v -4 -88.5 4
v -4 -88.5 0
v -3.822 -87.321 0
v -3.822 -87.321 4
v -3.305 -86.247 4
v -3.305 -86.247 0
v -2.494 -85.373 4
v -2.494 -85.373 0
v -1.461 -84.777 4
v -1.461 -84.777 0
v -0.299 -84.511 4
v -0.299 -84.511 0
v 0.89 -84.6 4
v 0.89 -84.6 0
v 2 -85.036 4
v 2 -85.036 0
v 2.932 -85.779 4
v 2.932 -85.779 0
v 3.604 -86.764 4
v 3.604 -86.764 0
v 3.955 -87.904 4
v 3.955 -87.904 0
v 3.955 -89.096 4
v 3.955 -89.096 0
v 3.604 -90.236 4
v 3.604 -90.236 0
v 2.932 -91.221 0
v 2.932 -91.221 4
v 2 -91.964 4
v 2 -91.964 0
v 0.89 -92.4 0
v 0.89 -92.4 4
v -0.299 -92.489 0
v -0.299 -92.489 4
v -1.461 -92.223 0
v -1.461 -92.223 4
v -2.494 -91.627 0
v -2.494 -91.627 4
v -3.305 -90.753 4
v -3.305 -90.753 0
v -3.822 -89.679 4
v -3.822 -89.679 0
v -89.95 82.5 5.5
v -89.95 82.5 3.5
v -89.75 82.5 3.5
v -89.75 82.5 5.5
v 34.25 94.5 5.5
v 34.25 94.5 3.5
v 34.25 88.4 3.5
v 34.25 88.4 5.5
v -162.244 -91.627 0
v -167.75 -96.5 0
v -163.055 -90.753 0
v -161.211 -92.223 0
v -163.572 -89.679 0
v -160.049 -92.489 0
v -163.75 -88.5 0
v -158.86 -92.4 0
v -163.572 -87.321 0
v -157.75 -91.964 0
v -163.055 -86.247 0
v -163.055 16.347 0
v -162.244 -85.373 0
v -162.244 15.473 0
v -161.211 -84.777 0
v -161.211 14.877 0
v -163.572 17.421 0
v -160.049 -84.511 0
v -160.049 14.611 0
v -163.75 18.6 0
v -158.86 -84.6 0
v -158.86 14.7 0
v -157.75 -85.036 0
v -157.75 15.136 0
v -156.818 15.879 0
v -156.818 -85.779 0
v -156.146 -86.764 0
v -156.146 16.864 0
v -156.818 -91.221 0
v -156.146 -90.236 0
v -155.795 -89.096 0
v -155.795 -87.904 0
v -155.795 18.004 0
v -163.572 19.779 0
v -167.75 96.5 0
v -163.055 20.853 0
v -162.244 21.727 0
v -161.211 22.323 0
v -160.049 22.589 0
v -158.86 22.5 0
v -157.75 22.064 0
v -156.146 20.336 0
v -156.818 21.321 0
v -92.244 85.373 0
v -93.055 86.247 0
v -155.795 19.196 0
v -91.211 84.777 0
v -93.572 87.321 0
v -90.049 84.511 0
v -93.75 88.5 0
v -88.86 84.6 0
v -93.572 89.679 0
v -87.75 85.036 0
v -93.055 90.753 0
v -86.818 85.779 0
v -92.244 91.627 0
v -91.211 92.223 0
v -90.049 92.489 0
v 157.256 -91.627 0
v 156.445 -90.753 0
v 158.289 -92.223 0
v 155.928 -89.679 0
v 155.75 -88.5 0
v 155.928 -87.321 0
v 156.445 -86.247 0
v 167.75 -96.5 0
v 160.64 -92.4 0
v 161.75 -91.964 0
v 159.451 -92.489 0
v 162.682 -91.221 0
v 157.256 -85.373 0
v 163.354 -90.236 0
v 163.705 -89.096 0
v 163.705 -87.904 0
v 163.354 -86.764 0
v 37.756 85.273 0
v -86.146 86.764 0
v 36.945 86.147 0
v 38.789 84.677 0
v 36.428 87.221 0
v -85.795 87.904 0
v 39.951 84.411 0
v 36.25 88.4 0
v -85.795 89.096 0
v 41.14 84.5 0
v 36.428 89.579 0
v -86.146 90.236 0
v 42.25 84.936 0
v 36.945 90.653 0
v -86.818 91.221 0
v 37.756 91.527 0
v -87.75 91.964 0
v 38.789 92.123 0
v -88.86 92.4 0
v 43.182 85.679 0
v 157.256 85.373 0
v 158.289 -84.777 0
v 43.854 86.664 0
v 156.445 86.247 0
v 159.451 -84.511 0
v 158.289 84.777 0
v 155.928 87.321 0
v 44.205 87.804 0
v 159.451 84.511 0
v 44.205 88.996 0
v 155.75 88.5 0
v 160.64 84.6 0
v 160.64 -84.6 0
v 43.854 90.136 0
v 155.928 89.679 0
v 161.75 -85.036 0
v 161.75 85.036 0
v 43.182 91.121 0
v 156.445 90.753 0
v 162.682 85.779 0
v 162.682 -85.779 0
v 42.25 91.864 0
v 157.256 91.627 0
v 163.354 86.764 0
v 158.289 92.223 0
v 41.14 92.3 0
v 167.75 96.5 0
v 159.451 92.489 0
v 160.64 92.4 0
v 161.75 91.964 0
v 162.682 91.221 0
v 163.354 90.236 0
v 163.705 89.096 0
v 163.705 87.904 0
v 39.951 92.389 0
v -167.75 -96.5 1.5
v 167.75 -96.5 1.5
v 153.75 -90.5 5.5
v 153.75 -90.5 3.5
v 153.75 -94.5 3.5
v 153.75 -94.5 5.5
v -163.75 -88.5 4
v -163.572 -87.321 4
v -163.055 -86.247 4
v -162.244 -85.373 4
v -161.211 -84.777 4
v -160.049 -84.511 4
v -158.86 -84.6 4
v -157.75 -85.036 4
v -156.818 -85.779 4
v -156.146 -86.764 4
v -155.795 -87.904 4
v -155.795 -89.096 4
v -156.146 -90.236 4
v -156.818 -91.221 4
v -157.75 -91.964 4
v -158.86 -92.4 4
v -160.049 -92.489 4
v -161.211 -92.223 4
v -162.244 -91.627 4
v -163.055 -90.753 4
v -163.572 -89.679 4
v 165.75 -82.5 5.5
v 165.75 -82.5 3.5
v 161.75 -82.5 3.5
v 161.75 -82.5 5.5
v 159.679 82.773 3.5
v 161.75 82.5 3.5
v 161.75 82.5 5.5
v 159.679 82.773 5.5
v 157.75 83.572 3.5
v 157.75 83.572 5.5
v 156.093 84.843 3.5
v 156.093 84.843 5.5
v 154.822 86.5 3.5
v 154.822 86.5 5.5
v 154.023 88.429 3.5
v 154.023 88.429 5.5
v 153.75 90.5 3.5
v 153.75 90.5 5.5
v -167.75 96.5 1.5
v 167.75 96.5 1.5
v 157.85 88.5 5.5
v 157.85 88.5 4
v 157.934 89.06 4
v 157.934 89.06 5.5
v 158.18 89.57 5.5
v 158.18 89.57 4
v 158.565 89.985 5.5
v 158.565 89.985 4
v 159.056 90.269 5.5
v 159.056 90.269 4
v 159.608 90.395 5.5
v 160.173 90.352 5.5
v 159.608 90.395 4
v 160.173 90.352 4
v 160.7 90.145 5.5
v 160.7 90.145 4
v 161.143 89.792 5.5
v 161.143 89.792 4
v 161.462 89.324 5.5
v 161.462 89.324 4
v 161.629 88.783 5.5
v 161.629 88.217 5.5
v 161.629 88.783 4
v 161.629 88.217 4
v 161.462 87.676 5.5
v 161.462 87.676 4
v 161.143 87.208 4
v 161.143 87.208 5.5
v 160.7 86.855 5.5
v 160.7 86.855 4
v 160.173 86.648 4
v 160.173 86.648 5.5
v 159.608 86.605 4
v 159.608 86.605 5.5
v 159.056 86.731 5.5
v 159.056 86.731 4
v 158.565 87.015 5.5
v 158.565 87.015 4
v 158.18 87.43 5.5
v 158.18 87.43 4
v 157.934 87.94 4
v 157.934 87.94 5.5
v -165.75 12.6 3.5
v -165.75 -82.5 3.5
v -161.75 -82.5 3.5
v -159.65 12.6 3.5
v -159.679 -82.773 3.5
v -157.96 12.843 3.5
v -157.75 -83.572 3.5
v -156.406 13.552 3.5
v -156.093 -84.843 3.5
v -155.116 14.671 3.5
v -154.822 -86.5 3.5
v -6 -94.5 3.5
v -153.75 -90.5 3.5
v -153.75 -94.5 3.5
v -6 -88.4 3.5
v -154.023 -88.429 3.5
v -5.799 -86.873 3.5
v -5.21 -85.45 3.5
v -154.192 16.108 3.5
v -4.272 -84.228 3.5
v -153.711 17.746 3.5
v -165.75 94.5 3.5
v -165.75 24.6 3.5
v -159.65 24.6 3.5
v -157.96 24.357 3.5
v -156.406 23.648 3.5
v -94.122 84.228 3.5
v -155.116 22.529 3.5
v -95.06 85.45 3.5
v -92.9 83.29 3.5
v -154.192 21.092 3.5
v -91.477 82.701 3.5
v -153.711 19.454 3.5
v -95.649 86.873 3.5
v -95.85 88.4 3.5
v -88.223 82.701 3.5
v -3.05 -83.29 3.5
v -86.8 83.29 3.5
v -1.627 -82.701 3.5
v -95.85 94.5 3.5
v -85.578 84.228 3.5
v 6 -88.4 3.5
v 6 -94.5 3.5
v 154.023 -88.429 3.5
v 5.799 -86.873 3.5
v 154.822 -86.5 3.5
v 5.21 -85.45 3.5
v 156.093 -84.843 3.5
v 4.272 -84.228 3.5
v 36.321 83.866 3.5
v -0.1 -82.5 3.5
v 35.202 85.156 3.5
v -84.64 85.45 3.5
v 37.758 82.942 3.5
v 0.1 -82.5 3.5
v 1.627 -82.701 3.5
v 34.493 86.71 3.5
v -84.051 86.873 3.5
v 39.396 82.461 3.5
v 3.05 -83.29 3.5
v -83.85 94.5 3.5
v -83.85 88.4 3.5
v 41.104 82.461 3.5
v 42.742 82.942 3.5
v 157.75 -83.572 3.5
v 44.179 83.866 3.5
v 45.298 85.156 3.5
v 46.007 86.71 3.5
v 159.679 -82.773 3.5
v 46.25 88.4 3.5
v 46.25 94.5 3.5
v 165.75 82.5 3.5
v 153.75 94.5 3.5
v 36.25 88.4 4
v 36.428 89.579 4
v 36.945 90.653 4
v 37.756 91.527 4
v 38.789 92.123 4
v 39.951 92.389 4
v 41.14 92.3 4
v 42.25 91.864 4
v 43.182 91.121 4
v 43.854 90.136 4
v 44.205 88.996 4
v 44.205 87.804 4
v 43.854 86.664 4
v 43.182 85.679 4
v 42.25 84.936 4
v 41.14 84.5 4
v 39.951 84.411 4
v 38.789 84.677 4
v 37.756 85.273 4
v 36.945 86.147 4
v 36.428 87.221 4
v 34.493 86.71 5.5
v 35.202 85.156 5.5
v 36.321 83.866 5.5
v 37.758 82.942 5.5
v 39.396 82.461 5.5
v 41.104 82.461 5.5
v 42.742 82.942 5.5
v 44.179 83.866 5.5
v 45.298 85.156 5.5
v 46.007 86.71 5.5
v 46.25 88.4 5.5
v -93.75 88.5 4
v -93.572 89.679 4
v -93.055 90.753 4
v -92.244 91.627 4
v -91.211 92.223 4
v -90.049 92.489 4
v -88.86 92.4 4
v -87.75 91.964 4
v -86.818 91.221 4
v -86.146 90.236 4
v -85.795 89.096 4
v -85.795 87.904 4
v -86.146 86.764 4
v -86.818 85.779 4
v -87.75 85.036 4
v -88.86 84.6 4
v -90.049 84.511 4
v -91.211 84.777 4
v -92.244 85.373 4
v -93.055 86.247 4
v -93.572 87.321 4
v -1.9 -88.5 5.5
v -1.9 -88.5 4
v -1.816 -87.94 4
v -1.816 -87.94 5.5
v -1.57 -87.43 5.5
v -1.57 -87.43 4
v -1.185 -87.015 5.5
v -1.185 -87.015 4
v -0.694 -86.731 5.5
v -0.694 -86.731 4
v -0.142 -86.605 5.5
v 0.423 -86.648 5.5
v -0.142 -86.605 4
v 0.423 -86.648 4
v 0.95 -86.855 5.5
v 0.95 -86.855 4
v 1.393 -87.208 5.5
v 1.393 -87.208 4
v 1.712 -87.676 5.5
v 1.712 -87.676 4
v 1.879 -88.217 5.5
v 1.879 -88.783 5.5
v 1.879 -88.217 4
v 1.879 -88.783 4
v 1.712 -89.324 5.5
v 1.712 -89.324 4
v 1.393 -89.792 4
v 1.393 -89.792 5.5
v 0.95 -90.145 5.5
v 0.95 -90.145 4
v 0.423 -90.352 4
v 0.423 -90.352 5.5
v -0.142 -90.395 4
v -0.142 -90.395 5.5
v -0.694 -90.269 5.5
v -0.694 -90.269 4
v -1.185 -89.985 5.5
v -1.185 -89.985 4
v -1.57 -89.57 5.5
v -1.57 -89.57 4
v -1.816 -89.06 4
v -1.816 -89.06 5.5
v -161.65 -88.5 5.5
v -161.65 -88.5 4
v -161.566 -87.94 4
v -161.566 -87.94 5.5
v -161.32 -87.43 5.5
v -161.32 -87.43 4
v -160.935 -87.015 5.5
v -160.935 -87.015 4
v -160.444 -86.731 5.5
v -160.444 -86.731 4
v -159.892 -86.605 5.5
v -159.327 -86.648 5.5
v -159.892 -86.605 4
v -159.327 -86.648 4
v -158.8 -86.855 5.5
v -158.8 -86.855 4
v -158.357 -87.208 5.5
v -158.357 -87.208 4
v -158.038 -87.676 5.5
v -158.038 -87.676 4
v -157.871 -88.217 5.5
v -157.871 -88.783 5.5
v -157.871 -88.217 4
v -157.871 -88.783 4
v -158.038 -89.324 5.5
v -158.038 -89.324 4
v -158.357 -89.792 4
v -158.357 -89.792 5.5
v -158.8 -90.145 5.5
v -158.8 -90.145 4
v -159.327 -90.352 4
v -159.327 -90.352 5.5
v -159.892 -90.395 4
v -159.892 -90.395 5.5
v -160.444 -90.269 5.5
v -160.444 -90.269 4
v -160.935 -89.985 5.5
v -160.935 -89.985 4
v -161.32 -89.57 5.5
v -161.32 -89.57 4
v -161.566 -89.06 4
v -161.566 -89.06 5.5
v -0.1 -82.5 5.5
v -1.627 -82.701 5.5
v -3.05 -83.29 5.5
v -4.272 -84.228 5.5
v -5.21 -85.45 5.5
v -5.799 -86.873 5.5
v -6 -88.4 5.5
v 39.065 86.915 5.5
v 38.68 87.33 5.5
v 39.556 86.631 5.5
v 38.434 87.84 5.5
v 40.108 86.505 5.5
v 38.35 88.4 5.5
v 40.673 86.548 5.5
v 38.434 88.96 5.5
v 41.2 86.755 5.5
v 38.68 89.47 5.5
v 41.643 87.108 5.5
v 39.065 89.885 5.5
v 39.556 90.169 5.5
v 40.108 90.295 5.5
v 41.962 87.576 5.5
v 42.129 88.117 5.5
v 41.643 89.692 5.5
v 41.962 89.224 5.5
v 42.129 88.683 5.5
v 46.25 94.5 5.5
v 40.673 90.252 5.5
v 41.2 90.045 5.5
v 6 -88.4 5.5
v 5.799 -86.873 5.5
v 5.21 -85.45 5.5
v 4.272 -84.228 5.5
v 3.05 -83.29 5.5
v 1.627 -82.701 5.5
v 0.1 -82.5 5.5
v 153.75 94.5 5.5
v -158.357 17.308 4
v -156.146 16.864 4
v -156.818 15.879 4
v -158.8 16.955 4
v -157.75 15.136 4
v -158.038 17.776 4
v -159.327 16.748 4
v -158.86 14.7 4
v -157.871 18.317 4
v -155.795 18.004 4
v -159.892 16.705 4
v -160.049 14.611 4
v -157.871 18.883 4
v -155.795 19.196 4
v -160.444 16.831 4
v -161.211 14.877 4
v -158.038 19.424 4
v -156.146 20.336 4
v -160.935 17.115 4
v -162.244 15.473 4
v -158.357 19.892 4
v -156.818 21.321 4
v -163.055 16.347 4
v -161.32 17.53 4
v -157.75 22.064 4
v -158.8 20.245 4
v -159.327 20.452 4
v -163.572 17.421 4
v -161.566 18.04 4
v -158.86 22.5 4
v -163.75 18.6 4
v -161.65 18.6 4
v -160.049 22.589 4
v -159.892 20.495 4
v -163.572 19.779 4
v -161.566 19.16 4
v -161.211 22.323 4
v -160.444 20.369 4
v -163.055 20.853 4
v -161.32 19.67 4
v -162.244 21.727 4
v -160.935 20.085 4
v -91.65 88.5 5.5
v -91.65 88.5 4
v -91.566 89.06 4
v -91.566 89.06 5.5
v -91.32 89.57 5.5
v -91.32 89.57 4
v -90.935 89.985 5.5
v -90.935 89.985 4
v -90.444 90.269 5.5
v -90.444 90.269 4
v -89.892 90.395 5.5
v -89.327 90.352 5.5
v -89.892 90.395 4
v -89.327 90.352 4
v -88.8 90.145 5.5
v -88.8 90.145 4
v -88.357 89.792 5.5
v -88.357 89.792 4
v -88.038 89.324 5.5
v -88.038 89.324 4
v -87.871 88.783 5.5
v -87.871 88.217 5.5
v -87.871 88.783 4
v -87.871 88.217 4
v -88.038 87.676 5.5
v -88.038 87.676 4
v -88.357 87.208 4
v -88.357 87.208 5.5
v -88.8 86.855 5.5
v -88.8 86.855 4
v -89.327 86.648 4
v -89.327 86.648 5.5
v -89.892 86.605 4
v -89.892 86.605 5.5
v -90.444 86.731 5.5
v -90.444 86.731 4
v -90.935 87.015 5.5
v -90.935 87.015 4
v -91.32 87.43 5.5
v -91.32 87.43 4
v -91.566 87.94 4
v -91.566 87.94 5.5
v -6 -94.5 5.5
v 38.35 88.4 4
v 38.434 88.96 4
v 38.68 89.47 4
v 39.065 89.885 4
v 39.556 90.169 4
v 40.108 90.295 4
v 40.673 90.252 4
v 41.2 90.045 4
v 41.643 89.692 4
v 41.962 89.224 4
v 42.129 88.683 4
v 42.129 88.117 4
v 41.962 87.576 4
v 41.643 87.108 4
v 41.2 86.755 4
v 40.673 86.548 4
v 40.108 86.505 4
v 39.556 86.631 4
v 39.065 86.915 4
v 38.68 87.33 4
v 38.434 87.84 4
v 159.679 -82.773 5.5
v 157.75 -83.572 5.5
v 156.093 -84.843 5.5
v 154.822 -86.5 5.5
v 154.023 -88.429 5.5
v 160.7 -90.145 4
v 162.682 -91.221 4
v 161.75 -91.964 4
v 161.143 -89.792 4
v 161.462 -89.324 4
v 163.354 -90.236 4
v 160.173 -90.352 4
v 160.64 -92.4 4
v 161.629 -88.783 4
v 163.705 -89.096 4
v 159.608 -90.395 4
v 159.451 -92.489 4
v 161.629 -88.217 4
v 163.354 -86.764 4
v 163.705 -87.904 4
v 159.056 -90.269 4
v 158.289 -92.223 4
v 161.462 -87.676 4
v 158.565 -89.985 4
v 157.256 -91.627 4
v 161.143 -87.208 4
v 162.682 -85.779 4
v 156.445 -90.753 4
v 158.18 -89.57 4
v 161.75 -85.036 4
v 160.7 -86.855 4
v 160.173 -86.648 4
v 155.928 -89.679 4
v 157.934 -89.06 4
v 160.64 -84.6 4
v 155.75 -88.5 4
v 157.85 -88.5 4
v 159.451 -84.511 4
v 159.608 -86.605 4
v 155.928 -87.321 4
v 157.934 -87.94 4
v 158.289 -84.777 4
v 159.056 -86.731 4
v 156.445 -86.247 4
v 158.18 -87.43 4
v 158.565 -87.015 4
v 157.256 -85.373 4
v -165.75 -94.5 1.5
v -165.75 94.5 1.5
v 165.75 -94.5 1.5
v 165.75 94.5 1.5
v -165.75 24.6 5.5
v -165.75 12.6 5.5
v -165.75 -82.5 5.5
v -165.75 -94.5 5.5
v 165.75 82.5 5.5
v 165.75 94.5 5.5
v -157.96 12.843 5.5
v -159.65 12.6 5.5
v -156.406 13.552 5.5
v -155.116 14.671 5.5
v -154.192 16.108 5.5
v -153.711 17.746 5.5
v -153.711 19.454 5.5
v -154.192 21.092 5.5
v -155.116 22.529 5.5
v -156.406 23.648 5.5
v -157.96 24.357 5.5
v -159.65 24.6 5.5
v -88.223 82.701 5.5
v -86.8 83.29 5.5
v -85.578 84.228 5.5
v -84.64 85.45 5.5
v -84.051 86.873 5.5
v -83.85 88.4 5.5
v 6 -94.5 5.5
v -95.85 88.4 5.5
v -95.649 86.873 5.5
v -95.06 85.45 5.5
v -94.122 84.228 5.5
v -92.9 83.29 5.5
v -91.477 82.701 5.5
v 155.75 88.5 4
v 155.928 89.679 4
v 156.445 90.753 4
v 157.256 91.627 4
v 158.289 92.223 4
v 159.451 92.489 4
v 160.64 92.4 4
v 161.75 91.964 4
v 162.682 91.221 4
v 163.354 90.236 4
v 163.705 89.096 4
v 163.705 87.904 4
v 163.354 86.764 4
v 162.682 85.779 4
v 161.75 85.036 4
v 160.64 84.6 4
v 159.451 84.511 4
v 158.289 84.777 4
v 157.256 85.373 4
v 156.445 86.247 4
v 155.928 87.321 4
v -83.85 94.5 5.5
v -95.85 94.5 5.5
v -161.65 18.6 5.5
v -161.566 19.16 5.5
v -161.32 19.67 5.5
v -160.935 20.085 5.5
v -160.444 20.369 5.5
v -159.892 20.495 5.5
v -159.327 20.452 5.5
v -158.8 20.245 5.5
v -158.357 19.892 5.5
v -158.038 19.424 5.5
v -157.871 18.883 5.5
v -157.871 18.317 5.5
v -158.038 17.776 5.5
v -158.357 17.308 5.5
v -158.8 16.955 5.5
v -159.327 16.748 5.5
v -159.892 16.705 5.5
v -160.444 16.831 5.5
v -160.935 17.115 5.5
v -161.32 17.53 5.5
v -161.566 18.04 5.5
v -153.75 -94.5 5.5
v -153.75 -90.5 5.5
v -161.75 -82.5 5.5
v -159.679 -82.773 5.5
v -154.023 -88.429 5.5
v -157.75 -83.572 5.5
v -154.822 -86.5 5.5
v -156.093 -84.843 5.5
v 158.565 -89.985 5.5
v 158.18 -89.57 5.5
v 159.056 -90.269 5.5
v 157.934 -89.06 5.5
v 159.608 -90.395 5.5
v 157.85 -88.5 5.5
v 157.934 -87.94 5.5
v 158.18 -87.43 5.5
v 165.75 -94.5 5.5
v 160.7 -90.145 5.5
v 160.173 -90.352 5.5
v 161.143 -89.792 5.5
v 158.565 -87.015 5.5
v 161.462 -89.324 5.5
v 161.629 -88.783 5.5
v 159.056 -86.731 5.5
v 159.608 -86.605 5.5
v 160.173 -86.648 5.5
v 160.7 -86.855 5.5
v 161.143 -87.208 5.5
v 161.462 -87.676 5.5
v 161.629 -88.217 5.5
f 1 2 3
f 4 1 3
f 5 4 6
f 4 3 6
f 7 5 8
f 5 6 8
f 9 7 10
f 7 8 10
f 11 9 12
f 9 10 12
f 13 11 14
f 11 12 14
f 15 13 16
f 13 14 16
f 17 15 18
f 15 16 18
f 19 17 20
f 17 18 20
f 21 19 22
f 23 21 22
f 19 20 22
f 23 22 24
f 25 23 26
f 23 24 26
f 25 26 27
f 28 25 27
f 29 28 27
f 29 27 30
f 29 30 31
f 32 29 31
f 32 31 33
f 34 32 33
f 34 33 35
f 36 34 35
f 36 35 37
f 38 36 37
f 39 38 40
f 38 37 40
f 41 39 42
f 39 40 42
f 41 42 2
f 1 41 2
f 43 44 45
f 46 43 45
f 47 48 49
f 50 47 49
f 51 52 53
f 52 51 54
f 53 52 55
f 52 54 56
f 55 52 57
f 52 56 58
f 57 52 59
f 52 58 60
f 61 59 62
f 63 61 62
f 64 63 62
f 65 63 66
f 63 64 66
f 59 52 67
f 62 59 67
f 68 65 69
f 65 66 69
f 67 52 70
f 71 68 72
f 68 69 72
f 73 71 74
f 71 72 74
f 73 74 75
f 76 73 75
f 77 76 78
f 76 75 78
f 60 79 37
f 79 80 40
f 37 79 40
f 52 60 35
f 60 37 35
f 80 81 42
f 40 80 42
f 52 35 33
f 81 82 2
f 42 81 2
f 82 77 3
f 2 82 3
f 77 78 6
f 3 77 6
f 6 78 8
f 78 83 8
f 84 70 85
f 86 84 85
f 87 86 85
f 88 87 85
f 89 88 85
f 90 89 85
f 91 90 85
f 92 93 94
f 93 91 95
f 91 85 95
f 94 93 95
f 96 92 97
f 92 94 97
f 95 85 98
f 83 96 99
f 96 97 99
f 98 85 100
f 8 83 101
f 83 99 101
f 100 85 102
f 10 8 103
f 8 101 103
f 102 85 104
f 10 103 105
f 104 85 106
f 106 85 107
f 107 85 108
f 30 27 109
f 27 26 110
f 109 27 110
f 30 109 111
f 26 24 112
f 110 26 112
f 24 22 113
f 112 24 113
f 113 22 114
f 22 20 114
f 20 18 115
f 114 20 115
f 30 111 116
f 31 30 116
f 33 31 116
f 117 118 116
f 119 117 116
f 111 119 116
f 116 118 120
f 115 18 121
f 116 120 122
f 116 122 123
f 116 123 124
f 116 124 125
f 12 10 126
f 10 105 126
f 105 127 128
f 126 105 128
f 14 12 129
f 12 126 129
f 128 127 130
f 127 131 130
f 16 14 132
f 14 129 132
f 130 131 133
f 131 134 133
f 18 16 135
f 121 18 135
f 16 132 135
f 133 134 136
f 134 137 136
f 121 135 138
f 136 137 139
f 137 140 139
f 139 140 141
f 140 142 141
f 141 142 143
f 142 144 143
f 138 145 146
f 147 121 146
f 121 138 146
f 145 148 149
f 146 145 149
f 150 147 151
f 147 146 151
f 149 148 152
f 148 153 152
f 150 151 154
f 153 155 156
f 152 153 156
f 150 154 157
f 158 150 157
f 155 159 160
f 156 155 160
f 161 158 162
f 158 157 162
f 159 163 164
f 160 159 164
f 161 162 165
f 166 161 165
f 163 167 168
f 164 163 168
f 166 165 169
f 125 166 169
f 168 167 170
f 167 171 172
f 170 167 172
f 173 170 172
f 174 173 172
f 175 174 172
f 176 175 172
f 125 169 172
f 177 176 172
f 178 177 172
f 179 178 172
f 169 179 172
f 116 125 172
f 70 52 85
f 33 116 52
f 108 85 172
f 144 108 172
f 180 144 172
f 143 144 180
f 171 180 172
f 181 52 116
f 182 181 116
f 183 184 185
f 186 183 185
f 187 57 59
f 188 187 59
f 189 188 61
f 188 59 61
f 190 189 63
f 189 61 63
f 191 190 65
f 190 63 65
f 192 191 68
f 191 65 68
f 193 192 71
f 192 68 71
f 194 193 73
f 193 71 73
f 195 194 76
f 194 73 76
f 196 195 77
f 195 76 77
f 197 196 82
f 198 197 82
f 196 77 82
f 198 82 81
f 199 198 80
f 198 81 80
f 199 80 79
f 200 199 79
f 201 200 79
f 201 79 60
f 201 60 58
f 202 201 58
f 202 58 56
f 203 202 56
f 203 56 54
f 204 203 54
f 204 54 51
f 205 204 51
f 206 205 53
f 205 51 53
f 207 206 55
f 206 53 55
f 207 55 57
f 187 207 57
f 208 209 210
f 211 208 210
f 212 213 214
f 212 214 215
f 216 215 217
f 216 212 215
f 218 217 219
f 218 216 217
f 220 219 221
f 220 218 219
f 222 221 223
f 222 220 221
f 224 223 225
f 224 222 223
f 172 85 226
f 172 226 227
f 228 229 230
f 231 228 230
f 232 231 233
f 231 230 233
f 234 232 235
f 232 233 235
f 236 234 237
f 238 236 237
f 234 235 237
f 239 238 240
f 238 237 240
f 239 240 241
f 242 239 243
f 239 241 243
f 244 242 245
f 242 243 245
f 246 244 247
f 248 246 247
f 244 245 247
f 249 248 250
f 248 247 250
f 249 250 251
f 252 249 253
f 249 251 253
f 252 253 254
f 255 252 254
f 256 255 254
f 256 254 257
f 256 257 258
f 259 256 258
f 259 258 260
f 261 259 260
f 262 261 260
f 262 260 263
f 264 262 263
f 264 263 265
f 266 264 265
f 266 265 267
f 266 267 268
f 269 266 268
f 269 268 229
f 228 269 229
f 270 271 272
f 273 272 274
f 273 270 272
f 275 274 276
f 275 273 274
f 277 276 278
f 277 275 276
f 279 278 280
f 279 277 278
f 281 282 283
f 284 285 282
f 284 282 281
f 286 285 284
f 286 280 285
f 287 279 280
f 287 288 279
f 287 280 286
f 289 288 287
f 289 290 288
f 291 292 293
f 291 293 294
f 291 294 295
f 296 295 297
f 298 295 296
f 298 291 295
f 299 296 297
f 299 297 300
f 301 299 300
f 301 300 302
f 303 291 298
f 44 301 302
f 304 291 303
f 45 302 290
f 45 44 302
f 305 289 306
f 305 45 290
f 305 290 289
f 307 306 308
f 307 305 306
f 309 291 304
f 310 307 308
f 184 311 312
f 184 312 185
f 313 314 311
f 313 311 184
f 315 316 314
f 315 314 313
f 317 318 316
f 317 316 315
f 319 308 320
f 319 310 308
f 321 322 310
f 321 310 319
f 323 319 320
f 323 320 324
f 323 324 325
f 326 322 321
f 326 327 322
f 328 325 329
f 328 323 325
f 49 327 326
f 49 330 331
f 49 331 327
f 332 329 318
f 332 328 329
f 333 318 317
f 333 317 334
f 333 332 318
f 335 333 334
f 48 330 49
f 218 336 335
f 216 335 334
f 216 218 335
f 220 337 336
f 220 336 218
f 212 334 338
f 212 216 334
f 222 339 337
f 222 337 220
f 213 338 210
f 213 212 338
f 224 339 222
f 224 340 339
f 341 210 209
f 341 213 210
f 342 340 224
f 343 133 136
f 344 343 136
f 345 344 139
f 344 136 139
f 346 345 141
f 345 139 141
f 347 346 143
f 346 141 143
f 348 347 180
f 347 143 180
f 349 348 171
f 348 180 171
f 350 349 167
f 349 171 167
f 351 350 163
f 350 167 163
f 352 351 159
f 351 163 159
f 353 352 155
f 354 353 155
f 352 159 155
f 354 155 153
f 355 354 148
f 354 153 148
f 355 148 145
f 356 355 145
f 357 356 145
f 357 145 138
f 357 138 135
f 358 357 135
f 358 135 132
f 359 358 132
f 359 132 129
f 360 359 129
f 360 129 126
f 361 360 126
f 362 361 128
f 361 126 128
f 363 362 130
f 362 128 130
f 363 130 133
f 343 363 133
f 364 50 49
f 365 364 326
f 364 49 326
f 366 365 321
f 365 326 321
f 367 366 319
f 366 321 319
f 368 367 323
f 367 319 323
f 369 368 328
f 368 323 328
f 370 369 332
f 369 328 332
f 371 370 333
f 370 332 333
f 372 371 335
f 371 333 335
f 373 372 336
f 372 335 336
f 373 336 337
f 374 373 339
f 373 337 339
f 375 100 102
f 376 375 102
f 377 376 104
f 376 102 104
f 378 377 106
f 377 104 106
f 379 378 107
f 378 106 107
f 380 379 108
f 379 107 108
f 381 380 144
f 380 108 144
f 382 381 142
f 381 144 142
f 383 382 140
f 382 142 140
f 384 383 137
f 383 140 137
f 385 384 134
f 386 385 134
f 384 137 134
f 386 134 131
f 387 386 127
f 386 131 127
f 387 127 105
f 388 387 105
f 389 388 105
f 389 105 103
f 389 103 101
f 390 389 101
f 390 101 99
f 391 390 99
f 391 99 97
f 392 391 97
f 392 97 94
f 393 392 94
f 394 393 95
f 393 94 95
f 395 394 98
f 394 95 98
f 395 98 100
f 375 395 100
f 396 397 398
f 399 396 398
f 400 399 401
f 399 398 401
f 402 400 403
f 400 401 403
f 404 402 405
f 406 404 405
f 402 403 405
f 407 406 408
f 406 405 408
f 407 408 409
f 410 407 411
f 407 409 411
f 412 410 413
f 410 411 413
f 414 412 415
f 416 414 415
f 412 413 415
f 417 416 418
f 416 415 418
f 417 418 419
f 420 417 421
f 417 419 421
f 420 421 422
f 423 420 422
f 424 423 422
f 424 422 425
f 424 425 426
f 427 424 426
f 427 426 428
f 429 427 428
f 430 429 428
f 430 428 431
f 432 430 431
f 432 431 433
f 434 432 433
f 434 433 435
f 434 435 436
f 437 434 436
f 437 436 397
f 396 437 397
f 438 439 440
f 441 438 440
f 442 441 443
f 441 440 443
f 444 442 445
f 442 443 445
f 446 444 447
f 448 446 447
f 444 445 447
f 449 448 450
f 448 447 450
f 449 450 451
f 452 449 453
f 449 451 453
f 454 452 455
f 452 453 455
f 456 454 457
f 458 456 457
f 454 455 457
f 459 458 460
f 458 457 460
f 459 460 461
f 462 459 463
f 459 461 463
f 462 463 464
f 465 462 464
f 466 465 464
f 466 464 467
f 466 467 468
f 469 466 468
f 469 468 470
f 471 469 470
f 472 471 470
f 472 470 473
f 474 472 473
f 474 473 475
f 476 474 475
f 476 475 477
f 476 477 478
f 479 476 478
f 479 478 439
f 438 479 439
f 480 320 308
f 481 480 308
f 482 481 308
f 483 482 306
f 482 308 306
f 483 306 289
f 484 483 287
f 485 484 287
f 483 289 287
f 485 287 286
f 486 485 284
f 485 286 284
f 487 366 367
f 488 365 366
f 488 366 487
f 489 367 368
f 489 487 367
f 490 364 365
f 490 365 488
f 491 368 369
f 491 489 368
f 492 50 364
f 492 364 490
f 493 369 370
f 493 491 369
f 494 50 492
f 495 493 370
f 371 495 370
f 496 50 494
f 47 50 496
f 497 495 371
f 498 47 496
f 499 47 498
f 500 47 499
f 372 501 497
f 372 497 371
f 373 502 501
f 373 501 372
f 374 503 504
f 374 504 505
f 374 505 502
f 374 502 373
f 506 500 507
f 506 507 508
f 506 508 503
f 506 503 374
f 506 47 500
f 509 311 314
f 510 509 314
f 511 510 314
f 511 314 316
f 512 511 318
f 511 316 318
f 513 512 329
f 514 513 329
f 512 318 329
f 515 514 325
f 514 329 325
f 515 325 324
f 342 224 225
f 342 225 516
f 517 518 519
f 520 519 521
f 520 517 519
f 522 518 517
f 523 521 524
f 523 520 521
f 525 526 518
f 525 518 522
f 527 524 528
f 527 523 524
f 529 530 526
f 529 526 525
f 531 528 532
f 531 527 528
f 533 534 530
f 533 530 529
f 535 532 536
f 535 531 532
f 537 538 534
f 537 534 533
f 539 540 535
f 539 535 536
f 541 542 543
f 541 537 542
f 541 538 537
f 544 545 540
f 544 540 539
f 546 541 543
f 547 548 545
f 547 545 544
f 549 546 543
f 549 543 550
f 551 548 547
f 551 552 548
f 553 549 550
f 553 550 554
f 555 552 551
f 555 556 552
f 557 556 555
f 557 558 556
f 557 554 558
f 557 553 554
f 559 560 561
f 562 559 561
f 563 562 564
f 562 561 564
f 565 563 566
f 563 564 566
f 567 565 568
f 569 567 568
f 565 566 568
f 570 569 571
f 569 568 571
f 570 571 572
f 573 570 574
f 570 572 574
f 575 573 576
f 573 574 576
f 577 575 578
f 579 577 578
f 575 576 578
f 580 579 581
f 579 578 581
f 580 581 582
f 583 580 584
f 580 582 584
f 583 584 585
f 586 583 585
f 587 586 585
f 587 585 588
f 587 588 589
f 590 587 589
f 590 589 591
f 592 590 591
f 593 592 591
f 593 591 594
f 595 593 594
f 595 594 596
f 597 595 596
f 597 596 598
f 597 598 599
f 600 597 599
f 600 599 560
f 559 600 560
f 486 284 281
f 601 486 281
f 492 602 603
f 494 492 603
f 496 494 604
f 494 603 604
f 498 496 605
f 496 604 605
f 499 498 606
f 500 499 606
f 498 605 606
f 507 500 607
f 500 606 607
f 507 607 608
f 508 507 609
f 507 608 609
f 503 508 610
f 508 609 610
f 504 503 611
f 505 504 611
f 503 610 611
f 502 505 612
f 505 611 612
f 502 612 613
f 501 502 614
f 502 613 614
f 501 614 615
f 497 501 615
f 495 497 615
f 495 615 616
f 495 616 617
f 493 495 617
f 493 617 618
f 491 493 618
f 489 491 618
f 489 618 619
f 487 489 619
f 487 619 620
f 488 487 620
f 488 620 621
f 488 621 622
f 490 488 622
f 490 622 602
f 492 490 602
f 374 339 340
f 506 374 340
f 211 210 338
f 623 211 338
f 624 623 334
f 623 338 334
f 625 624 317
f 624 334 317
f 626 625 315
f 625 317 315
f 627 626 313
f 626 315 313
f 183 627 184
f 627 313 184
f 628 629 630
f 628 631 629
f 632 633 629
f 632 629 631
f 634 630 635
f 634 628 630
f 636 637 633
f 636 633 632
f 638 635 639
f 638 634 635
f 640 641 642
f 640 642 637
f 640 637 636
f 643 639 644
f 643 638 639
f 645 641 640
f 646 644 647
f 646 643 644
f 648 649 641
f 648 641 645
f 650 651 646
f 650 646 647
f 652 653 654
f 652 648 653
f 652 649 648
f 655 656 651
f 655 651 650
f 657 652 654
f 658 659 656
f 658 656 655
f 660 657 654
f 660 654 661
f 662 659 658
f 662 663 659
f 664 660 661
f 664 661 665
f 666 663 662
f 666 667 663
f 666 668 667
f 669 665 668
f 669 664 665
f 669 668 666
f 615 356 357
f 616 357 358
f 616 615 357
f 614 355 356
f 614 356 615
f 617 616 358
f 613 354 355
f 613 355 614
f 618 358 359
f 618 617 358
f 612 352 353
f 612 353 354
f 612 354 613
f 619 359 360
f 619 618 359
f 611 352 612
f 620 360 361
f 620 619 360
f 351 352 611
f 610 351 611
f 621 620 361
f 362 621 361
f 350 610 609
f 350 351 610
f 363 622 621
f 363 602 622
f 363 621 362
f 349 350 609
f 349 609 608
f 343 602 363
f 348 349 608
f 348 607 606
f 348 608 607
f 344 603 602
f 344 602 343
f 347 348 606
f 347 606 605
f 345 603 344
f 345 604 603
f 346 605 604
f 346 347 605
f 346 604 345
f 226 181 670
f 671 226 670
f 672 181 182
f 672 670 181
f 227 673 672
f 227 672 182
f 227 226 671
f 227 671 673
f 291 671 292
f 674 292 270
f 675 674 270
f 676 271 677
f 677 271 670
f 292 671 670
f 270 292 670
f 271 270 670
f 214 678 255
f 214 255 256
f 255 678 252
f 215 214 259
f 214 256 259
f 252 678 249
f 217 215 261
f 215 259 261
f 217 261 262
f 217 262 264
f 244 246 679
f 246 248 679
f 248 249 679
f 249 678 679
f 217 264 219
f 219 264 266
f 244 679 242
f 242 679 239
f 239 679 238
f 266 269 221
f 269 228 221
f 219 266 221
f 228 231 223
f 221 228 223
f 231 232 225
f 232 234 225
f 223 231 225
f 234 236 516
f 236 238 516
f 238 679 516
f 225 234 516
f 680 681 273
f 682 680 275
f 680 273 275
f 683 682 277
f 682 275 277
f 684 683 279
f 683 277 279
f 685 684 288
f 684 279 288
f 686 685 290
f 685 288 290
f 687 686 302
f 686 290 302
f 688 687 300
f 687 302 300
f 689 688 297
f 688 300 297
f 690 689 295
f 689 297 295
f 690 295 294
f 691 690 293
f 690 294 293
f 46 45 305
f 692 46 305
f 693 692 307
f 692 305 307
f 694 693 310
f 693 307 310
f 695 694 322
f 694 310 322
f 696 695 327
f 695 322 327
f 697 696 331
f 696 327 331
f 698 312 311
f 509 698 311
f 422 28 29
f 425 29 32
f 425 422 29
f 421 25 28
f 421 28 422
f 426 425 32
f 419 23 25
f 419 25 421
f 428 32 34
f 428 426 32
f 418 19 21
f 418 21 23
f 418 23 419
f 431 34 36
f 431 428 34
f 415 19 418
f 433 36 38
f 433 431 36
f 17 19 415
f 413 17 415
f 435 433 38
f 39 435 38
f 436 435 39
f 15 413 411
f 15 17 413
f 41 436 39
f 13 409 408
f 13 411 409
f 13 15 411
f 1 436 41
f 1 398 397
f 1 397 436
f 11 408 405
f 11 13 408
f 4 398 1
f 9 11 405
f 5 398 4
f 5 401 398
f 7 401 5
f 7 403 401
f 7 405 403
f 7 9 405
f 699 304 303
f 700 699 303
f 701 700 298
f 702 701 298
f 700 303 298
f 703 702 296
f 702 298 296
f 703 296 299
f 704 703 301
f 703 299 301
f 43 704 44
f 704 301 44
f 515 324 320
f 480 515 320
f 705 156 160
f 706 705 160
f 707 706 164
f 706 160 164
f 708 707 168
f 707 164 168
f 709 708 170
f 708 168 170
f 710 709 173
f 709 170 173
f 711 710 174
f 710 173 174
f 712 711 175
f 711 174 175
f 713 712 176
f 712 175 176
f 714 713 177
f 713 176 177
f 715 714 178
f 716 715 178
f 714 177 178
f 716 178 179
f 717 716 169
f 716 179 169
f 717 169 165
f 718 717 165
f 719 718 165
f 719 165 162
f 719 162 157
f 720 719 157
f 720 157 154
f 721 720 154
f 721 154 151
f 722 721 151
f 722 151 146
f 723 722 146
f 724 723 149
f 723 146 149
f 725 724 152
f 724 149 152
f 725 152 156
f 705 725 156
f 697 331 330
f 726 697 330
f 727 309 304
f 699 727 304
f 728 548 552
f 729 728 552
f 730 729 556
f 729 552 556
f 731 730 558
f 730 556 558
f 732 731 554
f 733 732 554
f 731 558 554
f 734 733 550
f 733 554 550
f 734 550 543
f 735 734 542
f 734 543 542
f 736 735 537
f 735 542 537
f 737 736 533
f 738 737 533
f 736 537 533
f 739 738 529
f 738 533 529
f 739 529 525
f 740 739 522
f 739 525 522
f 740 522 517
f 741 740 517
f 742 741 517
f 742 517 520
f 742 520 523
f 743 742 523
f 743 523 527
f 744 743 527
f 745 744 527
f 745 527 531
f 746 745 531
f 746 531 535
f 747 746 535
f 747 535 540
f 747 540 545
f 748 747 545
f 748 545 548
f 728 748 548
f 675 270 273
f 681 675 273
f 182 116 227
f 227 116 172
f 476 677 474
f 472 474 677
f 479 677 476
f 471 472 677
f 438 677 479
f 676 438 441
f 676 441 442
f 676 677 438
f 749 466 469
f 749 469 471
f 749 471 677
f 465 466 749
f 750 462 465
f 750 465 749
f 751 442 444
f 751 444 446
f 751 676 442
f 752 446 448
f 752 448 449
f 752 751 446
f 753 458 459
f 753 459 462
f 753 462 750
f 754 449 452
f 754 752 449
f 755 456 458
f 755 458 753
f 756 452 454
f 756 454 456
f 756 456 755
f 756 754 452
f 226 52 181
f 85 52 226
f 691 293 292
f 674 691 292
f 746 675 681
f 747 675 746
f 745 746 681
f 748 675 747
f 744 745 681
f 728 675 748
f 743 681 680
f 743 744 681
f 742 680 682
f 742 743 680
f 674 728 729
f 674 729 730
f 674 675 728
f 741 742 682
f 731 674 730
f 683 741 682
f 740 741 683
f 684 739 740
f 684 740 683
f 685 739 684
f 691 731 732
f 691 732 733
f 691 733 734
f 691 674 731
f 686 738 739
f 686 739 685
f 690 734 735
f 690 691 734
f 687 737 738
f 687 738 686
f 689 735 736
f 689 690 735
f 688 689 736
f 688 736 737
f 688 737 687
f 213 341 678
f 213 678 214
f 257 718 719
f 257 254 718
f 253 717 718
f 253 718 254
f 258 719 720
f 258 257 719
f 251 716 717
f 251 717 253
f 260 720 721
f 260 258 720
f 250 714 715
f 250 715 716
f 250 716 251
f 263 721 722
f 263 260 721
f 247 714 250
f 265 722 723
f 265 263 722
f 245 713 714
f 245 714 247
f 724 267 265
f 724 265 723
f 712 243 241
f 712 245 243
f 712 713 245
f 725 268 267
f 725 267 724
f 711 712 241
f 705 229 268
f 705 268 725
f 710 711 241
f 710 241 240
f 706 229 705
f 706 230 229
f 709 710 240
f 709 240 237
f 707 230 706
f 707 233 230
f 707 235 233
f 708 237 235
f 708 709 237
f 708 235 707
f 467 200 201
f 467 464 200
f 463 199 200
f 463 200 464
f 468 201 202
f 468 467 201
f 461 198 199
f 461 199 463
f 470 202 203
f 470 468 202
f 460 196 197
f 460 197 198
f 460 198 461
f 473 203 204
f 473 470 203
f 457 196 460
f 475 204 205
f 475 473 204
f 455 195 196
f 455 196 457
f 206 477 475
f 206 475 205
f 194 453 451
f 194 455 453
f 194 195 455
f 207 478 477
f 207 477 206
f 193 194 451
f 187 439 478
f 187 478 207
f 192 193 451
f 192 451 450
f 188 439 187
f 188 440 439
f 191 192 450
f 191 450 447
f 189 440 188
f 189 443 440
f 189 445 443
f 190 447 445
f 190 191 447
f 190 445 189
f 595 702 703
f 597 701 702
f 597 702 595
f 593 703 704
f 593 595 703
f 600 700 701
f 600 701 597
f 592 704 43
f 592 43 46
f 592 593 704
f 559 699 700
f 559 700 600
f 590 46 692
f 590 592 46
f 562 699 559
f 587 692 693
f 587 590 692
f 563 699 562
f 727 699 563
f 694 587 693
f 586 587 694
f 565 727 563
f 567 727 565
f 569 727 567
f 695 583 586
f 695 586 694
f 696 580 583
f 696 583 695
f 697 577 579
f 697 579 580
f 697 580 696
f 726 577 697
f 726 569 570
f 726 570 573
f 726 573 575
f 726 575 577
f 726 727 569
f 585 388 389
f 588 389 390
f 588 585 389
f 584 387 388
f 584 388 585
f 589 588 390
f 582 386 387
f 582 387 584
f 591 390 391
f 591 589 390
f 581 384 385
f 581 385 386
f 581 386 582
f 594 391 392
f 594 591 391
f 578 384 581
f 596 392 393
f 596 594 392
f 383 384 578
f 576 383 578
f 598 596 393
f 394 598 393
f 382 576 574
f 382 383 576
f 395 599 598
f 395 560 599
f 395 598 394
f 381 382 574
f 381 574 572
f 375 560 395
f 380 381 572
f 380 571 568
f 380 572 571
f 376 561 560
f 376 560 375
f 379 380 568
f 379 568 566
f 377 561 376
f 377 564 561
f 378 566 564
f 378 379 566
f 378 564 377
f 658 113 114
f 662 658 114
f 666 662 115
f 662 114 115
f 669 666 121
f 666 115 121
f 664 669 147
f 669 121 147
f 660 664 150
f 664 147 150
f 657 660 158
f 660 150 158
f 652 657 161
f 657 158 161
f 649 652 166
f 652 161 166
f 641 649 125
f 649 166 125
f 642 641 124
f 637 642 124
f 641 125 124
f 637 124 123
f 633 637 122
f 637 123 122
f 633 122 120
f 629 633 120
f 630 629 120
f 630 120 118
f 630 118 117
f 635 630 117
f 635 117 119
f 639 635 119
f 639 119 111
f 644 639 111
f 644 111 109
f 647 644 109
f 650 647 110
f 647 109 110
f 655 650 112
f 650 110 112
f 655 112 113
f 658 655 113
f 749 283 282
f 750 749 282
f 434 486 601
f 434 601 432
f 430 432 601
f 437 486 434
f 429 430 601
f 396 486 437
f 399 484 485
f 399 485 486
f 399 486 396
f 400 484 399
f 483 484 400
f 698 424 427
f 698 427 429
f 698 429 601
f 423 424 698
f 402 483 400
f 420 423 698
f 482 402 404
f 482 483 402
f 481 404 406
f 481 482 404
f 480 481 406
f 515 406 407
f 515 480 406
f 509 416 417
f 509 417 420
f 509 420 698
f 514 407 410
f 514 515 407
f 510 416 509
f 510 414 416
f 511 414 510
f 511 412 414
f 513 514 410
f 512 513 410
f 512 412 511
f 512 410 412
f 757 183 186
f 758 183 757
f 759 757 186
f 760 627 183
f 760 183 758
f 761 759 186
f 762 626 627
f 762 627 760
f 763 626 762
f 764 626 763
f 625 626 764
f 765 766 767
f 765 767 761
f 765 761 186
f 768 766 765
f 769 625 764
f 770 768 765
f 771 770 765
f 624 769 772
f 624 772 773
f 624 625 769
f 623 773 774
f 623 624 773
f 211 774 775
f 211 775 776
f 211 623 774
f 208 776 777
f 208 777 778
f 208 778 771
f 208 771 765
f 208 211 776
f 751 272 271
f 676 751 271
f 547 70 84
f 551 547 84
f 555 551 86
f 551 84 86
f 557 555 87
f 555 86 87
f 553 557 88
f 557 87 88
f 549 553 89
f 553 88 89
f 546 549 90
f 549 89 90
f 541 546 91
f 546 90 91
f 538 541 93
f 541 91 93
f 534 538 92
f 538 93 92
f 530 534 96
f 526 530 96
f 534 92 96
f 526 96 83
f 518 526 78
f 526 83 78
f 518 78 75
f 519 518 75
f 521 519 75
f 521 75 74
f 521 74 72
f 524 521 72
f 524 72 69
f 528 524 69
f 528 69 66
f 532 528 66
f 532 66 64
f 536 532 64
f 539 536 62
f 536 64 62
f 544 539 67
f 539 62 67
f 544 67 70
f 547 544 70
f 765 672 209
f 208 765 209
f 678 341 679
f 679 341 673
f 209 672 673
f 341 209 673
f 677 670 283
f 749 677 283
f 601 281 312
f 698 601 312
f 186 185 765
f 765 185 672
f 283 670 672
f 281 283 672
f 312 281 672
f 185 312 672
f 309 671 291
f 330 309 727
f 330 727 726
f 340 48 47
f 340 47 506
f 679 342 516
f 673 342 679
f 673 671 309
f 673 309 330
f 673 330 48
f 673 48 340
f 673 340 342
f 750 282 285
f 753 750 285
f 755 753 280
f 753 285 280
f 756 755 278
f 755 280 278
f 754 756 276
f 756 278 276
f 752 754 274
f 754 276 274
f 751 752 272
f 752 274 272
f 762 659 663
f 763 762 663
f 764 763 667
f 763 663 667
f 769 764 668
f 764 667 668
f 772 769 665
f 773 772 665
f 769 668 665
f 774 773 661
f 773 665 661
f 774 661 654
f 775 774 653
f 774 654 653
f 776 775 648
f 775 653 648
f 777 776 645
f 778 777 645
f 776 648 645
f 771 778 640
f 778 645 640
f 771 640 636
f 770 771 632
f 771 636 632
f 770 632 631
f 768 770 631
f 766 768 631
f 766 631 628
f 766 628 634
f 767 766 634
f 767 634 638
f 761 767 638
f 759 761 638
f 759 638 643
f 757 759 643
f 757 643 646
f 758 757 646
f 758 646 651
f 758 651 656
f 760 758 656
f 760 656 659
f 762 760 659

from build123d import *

# Parameters (mm, degrees)
SKETCH1_W           = 335.5
SKETCH1_H           = 193
BOSS_EXTRUDE1_DEPTH = 1.5
BOSS_EXTRUDE2_DEPTH = 2
BOSS_EXTRUDE3_DEPTH = 4
SKETCH5_R           = 4
CUT_EXTRUDE1_DEPTH  = 4
SKETCH6_R           = 1.9
CUT_EXTRUDE2_DEPTH  = 14


with BuildPart() as part:
    # Sketch1 → Boss-Extrude1 (new body)
    with BuildSketch(Plane.XY):
        Rectangle(SKETCH1_W, SKETCH1_H)
    extrude(amount=BOSS_EXTRUDE1_DEPTH)

    # Sketch2 → Boss-Extrude2 (add)
    with BuildSketch(Plane.XY.offset(1.5)):
        with BuildLine():
            Line((-153.75, -90.5), (-153.75, -94.5))
            Line((-153.75, -94.5), (-6, -94.5))
            Line((-6, -94.5), (-6, -88.4))
            ThreePointArc((-6, -88.4), (-4.271930009, -84.228069991), (-0.1, -82.5))
            Line((-0.1, -82.5), (0.1, -82.5))
            ThreePointArc((0.1, -82.5), (4.271930009, -84.228069991), (6, -88.4))
            Line((6, -88.4), (6, -94.5))
            Line((6, -94.5), (153.75, -94.5))
            Line((153.75, -94.5), (153.75, -90.5))
            ThreePointArc((153.75, -90.5), (156.093145751, -84.843145751), (161.75, -82.5))
            Line((161.75, -82.5), (165.75, -82.5))
            Line((165.75, -82.5), (165.75, 82.5))
            Line((165.75, 82.5), (161.75, 82.5))
            ThreePointArc((161.75, 82.5), (156.093145751, 84.843145751), (153.75, 90.5))
            Line((153.75, 90.5), (153.75, 94.5))
            Line((153.75, 94.5), (6, 94.5))
            Line((6, 94.5), (-6, 94.5))
            Line((-6, 94.5), (-153.75, 94.5))
            Line((-153.75, 94.5), (-165.75, 94.5))
            Line((-165.75, 94.5), (-165.75, 82.5))
            Line((-165.75, 82.5), (-165.75, -82.5))
            Line((-165.75, -82.5), (-161.75, -82.5))
            ThreePointArc((-161.75, -82.5), (-156.093145751, -84.843145751), (-153.75, -90.5))
        make_face()
    extrude(amount=BOSS_EXTRUDE2_DEPTH)

    # Sketch4 → Boss-Extrude3 (add)
    with BuildSketch(Plane.XY.offset(1.5)):
        with BuildLine():
            Line((-165.75, -82.5), (-165.75, -94.5))
            Line((-165.75, -94.5), (-153.75, -94.5))
            Line((-153.75, -94.5), (-153.75, -90.5))
            ThreePointArc((-153.75, -90.5), (-156.093145751, -84.843145751), (-161.75, -82.5))
            Line((-161.75, -82.5), (-165.75, -82.5))
        make_face()
        with BuildLine():
            Line((-6, -94.5), (6, -94.5))
            Line((6, -94.5), (6, -88.4))
            ThreePointArc((6, -88.4), (4.271930009, -84.228069991), (0.1, -82.5))
            Line((0.1, -82.5), (-0.1, -82.5))
            ThreePointArc((-0.1, -82.5), (-4.271930009, -84.228069991), (-6, -88.4))
            Line((-6, -88.4), (-6, -94.5))
        make_face()
        with BuildLine():
            Line((153.75, -94.5), (165.75, -94.5))
            Line((165.75, -94.5), (165.75, -82.5))
            Line((165.75, -82.5), (161.75, -82.5))
            ThreePointArc((161.75, -82.5), (156.093145751, -84.843145751), (153.75, -90.5))
            Line((153.75, -90.5), (153.75, -94.5))
        make_face()
        with BuildLine():
            Line((165.75, 94.5), (165.75, 82.5))
            Line((165.75, 82.5), (161.75, 82.5))
            ThreePointArc((161.75, 82.5), (156.093145751, 84.843145751), (153.75, 90.5))
            Line((153.75, 90.5), (153.75, 94.5))
            Line((153.75, 94.5), (165.75, 94.5))
        make_face()
        with BuildLine():
            Line((-165.75, 24.6), (-165.75, 12.6))
            Line((-165.75, 12.6), (-159.65, 12.6))
            ThreePointArc((-159.65, 12.6), (-153.65, 18.6), (-159.65, 24.6))
            Line((-159.65, 24.6), (-165.75, 24.6))
        make_face()
        with BuildLine():
            Line((-83.85, 94.5), (-95.85, 94.5))
            Line((-95.85, 94.5), (-95.85, 88.4))
            ThreePointArc((-95.85, 88.4), (-94.121930009, 84.228069991), (-89.95, 82.5))
            Line((-89.95, 82.5), (-89.75, 82.5))
            ThreePointArc((-89.75, 82.5), (-85.578069991, 84.228069991), (-83.85, 88.4))
            Line((-83.85, 88.4), (-83.85, 94.5))
        make_face()
        with BuildLine():
            Line((46.25, 94.5), (34.25, 94.5))
            Line((34.25, 94.5), (34.25, 88.4))
            ThreePointArc((34.25, 88.4), (40.25, 82.4), (46.25, 88.4))
            Line((46.25, 88.4), (46.25, 94.5))
        make_face()
    extrude(amount=BOSS_EXTRUDE3_DEPTH)

    # Sketch5 → Cut-Extrude1 (cut)
    with BuildSketch(Plane(origin=(0, 0, 0), x_dir=(-1, 0, 0), z_dir=(0, 0, -1))):
        with Locations((-159.75, 88.5)):
            Circle(SKETCH5_R)
        with Locations((0, -88.5)):
            Circle(SKETCH5_R)
        with Locations((159.75, -88.5)):
            Circle(SKETCH5_R)
        with Locations((-159.75, -88.5)):
            Circle(SKETCH5_R)
        with Locations((89.75, 88.5)):
            Circle(SKETCH5_R)
        with Locations((-40.25, 88.4)):
            Circle(SKETCH5_R)
        with Locations((159.75, 18.6)):
            Circle(SKETCH5_R)
    extrude(amount=-CUT_EXTRUDE1_DEPTH, mode=Mode.SUBTRACT)

    # Sketch6 → Cut-Extrude2 (cut)
    with BuildSketch(Plane(origin=(0, 0, 0), x_dir=(-1, 0, 0), z_dir=(0, 0, -1))):
        with Locations((-159.75, -88.5)):
            Circle(SKETCH6_R)
        with Locations((0, -88.5)):
            Circle(SKETCH6_R)
        with Locations((159.75, -88.5)):
            Circle(SKETCH6_R)
        with Locations((-159.75, 88.5)):
            Circle(SKETCH6_R)
        with Locations((89.75, 88.5)):
            Circle(SKETCH6_R)
        with Locations((159.75, 18.6)):
            Circle(SKETCH6_R)
        with Locations((-40.25, 88.4)):
            Circle(SKETCH6_R)
    extrude(amount=-CUT_EXTRUDE2_DEPTH, mode=Mode.SUBTRACT)


solid = part.part
